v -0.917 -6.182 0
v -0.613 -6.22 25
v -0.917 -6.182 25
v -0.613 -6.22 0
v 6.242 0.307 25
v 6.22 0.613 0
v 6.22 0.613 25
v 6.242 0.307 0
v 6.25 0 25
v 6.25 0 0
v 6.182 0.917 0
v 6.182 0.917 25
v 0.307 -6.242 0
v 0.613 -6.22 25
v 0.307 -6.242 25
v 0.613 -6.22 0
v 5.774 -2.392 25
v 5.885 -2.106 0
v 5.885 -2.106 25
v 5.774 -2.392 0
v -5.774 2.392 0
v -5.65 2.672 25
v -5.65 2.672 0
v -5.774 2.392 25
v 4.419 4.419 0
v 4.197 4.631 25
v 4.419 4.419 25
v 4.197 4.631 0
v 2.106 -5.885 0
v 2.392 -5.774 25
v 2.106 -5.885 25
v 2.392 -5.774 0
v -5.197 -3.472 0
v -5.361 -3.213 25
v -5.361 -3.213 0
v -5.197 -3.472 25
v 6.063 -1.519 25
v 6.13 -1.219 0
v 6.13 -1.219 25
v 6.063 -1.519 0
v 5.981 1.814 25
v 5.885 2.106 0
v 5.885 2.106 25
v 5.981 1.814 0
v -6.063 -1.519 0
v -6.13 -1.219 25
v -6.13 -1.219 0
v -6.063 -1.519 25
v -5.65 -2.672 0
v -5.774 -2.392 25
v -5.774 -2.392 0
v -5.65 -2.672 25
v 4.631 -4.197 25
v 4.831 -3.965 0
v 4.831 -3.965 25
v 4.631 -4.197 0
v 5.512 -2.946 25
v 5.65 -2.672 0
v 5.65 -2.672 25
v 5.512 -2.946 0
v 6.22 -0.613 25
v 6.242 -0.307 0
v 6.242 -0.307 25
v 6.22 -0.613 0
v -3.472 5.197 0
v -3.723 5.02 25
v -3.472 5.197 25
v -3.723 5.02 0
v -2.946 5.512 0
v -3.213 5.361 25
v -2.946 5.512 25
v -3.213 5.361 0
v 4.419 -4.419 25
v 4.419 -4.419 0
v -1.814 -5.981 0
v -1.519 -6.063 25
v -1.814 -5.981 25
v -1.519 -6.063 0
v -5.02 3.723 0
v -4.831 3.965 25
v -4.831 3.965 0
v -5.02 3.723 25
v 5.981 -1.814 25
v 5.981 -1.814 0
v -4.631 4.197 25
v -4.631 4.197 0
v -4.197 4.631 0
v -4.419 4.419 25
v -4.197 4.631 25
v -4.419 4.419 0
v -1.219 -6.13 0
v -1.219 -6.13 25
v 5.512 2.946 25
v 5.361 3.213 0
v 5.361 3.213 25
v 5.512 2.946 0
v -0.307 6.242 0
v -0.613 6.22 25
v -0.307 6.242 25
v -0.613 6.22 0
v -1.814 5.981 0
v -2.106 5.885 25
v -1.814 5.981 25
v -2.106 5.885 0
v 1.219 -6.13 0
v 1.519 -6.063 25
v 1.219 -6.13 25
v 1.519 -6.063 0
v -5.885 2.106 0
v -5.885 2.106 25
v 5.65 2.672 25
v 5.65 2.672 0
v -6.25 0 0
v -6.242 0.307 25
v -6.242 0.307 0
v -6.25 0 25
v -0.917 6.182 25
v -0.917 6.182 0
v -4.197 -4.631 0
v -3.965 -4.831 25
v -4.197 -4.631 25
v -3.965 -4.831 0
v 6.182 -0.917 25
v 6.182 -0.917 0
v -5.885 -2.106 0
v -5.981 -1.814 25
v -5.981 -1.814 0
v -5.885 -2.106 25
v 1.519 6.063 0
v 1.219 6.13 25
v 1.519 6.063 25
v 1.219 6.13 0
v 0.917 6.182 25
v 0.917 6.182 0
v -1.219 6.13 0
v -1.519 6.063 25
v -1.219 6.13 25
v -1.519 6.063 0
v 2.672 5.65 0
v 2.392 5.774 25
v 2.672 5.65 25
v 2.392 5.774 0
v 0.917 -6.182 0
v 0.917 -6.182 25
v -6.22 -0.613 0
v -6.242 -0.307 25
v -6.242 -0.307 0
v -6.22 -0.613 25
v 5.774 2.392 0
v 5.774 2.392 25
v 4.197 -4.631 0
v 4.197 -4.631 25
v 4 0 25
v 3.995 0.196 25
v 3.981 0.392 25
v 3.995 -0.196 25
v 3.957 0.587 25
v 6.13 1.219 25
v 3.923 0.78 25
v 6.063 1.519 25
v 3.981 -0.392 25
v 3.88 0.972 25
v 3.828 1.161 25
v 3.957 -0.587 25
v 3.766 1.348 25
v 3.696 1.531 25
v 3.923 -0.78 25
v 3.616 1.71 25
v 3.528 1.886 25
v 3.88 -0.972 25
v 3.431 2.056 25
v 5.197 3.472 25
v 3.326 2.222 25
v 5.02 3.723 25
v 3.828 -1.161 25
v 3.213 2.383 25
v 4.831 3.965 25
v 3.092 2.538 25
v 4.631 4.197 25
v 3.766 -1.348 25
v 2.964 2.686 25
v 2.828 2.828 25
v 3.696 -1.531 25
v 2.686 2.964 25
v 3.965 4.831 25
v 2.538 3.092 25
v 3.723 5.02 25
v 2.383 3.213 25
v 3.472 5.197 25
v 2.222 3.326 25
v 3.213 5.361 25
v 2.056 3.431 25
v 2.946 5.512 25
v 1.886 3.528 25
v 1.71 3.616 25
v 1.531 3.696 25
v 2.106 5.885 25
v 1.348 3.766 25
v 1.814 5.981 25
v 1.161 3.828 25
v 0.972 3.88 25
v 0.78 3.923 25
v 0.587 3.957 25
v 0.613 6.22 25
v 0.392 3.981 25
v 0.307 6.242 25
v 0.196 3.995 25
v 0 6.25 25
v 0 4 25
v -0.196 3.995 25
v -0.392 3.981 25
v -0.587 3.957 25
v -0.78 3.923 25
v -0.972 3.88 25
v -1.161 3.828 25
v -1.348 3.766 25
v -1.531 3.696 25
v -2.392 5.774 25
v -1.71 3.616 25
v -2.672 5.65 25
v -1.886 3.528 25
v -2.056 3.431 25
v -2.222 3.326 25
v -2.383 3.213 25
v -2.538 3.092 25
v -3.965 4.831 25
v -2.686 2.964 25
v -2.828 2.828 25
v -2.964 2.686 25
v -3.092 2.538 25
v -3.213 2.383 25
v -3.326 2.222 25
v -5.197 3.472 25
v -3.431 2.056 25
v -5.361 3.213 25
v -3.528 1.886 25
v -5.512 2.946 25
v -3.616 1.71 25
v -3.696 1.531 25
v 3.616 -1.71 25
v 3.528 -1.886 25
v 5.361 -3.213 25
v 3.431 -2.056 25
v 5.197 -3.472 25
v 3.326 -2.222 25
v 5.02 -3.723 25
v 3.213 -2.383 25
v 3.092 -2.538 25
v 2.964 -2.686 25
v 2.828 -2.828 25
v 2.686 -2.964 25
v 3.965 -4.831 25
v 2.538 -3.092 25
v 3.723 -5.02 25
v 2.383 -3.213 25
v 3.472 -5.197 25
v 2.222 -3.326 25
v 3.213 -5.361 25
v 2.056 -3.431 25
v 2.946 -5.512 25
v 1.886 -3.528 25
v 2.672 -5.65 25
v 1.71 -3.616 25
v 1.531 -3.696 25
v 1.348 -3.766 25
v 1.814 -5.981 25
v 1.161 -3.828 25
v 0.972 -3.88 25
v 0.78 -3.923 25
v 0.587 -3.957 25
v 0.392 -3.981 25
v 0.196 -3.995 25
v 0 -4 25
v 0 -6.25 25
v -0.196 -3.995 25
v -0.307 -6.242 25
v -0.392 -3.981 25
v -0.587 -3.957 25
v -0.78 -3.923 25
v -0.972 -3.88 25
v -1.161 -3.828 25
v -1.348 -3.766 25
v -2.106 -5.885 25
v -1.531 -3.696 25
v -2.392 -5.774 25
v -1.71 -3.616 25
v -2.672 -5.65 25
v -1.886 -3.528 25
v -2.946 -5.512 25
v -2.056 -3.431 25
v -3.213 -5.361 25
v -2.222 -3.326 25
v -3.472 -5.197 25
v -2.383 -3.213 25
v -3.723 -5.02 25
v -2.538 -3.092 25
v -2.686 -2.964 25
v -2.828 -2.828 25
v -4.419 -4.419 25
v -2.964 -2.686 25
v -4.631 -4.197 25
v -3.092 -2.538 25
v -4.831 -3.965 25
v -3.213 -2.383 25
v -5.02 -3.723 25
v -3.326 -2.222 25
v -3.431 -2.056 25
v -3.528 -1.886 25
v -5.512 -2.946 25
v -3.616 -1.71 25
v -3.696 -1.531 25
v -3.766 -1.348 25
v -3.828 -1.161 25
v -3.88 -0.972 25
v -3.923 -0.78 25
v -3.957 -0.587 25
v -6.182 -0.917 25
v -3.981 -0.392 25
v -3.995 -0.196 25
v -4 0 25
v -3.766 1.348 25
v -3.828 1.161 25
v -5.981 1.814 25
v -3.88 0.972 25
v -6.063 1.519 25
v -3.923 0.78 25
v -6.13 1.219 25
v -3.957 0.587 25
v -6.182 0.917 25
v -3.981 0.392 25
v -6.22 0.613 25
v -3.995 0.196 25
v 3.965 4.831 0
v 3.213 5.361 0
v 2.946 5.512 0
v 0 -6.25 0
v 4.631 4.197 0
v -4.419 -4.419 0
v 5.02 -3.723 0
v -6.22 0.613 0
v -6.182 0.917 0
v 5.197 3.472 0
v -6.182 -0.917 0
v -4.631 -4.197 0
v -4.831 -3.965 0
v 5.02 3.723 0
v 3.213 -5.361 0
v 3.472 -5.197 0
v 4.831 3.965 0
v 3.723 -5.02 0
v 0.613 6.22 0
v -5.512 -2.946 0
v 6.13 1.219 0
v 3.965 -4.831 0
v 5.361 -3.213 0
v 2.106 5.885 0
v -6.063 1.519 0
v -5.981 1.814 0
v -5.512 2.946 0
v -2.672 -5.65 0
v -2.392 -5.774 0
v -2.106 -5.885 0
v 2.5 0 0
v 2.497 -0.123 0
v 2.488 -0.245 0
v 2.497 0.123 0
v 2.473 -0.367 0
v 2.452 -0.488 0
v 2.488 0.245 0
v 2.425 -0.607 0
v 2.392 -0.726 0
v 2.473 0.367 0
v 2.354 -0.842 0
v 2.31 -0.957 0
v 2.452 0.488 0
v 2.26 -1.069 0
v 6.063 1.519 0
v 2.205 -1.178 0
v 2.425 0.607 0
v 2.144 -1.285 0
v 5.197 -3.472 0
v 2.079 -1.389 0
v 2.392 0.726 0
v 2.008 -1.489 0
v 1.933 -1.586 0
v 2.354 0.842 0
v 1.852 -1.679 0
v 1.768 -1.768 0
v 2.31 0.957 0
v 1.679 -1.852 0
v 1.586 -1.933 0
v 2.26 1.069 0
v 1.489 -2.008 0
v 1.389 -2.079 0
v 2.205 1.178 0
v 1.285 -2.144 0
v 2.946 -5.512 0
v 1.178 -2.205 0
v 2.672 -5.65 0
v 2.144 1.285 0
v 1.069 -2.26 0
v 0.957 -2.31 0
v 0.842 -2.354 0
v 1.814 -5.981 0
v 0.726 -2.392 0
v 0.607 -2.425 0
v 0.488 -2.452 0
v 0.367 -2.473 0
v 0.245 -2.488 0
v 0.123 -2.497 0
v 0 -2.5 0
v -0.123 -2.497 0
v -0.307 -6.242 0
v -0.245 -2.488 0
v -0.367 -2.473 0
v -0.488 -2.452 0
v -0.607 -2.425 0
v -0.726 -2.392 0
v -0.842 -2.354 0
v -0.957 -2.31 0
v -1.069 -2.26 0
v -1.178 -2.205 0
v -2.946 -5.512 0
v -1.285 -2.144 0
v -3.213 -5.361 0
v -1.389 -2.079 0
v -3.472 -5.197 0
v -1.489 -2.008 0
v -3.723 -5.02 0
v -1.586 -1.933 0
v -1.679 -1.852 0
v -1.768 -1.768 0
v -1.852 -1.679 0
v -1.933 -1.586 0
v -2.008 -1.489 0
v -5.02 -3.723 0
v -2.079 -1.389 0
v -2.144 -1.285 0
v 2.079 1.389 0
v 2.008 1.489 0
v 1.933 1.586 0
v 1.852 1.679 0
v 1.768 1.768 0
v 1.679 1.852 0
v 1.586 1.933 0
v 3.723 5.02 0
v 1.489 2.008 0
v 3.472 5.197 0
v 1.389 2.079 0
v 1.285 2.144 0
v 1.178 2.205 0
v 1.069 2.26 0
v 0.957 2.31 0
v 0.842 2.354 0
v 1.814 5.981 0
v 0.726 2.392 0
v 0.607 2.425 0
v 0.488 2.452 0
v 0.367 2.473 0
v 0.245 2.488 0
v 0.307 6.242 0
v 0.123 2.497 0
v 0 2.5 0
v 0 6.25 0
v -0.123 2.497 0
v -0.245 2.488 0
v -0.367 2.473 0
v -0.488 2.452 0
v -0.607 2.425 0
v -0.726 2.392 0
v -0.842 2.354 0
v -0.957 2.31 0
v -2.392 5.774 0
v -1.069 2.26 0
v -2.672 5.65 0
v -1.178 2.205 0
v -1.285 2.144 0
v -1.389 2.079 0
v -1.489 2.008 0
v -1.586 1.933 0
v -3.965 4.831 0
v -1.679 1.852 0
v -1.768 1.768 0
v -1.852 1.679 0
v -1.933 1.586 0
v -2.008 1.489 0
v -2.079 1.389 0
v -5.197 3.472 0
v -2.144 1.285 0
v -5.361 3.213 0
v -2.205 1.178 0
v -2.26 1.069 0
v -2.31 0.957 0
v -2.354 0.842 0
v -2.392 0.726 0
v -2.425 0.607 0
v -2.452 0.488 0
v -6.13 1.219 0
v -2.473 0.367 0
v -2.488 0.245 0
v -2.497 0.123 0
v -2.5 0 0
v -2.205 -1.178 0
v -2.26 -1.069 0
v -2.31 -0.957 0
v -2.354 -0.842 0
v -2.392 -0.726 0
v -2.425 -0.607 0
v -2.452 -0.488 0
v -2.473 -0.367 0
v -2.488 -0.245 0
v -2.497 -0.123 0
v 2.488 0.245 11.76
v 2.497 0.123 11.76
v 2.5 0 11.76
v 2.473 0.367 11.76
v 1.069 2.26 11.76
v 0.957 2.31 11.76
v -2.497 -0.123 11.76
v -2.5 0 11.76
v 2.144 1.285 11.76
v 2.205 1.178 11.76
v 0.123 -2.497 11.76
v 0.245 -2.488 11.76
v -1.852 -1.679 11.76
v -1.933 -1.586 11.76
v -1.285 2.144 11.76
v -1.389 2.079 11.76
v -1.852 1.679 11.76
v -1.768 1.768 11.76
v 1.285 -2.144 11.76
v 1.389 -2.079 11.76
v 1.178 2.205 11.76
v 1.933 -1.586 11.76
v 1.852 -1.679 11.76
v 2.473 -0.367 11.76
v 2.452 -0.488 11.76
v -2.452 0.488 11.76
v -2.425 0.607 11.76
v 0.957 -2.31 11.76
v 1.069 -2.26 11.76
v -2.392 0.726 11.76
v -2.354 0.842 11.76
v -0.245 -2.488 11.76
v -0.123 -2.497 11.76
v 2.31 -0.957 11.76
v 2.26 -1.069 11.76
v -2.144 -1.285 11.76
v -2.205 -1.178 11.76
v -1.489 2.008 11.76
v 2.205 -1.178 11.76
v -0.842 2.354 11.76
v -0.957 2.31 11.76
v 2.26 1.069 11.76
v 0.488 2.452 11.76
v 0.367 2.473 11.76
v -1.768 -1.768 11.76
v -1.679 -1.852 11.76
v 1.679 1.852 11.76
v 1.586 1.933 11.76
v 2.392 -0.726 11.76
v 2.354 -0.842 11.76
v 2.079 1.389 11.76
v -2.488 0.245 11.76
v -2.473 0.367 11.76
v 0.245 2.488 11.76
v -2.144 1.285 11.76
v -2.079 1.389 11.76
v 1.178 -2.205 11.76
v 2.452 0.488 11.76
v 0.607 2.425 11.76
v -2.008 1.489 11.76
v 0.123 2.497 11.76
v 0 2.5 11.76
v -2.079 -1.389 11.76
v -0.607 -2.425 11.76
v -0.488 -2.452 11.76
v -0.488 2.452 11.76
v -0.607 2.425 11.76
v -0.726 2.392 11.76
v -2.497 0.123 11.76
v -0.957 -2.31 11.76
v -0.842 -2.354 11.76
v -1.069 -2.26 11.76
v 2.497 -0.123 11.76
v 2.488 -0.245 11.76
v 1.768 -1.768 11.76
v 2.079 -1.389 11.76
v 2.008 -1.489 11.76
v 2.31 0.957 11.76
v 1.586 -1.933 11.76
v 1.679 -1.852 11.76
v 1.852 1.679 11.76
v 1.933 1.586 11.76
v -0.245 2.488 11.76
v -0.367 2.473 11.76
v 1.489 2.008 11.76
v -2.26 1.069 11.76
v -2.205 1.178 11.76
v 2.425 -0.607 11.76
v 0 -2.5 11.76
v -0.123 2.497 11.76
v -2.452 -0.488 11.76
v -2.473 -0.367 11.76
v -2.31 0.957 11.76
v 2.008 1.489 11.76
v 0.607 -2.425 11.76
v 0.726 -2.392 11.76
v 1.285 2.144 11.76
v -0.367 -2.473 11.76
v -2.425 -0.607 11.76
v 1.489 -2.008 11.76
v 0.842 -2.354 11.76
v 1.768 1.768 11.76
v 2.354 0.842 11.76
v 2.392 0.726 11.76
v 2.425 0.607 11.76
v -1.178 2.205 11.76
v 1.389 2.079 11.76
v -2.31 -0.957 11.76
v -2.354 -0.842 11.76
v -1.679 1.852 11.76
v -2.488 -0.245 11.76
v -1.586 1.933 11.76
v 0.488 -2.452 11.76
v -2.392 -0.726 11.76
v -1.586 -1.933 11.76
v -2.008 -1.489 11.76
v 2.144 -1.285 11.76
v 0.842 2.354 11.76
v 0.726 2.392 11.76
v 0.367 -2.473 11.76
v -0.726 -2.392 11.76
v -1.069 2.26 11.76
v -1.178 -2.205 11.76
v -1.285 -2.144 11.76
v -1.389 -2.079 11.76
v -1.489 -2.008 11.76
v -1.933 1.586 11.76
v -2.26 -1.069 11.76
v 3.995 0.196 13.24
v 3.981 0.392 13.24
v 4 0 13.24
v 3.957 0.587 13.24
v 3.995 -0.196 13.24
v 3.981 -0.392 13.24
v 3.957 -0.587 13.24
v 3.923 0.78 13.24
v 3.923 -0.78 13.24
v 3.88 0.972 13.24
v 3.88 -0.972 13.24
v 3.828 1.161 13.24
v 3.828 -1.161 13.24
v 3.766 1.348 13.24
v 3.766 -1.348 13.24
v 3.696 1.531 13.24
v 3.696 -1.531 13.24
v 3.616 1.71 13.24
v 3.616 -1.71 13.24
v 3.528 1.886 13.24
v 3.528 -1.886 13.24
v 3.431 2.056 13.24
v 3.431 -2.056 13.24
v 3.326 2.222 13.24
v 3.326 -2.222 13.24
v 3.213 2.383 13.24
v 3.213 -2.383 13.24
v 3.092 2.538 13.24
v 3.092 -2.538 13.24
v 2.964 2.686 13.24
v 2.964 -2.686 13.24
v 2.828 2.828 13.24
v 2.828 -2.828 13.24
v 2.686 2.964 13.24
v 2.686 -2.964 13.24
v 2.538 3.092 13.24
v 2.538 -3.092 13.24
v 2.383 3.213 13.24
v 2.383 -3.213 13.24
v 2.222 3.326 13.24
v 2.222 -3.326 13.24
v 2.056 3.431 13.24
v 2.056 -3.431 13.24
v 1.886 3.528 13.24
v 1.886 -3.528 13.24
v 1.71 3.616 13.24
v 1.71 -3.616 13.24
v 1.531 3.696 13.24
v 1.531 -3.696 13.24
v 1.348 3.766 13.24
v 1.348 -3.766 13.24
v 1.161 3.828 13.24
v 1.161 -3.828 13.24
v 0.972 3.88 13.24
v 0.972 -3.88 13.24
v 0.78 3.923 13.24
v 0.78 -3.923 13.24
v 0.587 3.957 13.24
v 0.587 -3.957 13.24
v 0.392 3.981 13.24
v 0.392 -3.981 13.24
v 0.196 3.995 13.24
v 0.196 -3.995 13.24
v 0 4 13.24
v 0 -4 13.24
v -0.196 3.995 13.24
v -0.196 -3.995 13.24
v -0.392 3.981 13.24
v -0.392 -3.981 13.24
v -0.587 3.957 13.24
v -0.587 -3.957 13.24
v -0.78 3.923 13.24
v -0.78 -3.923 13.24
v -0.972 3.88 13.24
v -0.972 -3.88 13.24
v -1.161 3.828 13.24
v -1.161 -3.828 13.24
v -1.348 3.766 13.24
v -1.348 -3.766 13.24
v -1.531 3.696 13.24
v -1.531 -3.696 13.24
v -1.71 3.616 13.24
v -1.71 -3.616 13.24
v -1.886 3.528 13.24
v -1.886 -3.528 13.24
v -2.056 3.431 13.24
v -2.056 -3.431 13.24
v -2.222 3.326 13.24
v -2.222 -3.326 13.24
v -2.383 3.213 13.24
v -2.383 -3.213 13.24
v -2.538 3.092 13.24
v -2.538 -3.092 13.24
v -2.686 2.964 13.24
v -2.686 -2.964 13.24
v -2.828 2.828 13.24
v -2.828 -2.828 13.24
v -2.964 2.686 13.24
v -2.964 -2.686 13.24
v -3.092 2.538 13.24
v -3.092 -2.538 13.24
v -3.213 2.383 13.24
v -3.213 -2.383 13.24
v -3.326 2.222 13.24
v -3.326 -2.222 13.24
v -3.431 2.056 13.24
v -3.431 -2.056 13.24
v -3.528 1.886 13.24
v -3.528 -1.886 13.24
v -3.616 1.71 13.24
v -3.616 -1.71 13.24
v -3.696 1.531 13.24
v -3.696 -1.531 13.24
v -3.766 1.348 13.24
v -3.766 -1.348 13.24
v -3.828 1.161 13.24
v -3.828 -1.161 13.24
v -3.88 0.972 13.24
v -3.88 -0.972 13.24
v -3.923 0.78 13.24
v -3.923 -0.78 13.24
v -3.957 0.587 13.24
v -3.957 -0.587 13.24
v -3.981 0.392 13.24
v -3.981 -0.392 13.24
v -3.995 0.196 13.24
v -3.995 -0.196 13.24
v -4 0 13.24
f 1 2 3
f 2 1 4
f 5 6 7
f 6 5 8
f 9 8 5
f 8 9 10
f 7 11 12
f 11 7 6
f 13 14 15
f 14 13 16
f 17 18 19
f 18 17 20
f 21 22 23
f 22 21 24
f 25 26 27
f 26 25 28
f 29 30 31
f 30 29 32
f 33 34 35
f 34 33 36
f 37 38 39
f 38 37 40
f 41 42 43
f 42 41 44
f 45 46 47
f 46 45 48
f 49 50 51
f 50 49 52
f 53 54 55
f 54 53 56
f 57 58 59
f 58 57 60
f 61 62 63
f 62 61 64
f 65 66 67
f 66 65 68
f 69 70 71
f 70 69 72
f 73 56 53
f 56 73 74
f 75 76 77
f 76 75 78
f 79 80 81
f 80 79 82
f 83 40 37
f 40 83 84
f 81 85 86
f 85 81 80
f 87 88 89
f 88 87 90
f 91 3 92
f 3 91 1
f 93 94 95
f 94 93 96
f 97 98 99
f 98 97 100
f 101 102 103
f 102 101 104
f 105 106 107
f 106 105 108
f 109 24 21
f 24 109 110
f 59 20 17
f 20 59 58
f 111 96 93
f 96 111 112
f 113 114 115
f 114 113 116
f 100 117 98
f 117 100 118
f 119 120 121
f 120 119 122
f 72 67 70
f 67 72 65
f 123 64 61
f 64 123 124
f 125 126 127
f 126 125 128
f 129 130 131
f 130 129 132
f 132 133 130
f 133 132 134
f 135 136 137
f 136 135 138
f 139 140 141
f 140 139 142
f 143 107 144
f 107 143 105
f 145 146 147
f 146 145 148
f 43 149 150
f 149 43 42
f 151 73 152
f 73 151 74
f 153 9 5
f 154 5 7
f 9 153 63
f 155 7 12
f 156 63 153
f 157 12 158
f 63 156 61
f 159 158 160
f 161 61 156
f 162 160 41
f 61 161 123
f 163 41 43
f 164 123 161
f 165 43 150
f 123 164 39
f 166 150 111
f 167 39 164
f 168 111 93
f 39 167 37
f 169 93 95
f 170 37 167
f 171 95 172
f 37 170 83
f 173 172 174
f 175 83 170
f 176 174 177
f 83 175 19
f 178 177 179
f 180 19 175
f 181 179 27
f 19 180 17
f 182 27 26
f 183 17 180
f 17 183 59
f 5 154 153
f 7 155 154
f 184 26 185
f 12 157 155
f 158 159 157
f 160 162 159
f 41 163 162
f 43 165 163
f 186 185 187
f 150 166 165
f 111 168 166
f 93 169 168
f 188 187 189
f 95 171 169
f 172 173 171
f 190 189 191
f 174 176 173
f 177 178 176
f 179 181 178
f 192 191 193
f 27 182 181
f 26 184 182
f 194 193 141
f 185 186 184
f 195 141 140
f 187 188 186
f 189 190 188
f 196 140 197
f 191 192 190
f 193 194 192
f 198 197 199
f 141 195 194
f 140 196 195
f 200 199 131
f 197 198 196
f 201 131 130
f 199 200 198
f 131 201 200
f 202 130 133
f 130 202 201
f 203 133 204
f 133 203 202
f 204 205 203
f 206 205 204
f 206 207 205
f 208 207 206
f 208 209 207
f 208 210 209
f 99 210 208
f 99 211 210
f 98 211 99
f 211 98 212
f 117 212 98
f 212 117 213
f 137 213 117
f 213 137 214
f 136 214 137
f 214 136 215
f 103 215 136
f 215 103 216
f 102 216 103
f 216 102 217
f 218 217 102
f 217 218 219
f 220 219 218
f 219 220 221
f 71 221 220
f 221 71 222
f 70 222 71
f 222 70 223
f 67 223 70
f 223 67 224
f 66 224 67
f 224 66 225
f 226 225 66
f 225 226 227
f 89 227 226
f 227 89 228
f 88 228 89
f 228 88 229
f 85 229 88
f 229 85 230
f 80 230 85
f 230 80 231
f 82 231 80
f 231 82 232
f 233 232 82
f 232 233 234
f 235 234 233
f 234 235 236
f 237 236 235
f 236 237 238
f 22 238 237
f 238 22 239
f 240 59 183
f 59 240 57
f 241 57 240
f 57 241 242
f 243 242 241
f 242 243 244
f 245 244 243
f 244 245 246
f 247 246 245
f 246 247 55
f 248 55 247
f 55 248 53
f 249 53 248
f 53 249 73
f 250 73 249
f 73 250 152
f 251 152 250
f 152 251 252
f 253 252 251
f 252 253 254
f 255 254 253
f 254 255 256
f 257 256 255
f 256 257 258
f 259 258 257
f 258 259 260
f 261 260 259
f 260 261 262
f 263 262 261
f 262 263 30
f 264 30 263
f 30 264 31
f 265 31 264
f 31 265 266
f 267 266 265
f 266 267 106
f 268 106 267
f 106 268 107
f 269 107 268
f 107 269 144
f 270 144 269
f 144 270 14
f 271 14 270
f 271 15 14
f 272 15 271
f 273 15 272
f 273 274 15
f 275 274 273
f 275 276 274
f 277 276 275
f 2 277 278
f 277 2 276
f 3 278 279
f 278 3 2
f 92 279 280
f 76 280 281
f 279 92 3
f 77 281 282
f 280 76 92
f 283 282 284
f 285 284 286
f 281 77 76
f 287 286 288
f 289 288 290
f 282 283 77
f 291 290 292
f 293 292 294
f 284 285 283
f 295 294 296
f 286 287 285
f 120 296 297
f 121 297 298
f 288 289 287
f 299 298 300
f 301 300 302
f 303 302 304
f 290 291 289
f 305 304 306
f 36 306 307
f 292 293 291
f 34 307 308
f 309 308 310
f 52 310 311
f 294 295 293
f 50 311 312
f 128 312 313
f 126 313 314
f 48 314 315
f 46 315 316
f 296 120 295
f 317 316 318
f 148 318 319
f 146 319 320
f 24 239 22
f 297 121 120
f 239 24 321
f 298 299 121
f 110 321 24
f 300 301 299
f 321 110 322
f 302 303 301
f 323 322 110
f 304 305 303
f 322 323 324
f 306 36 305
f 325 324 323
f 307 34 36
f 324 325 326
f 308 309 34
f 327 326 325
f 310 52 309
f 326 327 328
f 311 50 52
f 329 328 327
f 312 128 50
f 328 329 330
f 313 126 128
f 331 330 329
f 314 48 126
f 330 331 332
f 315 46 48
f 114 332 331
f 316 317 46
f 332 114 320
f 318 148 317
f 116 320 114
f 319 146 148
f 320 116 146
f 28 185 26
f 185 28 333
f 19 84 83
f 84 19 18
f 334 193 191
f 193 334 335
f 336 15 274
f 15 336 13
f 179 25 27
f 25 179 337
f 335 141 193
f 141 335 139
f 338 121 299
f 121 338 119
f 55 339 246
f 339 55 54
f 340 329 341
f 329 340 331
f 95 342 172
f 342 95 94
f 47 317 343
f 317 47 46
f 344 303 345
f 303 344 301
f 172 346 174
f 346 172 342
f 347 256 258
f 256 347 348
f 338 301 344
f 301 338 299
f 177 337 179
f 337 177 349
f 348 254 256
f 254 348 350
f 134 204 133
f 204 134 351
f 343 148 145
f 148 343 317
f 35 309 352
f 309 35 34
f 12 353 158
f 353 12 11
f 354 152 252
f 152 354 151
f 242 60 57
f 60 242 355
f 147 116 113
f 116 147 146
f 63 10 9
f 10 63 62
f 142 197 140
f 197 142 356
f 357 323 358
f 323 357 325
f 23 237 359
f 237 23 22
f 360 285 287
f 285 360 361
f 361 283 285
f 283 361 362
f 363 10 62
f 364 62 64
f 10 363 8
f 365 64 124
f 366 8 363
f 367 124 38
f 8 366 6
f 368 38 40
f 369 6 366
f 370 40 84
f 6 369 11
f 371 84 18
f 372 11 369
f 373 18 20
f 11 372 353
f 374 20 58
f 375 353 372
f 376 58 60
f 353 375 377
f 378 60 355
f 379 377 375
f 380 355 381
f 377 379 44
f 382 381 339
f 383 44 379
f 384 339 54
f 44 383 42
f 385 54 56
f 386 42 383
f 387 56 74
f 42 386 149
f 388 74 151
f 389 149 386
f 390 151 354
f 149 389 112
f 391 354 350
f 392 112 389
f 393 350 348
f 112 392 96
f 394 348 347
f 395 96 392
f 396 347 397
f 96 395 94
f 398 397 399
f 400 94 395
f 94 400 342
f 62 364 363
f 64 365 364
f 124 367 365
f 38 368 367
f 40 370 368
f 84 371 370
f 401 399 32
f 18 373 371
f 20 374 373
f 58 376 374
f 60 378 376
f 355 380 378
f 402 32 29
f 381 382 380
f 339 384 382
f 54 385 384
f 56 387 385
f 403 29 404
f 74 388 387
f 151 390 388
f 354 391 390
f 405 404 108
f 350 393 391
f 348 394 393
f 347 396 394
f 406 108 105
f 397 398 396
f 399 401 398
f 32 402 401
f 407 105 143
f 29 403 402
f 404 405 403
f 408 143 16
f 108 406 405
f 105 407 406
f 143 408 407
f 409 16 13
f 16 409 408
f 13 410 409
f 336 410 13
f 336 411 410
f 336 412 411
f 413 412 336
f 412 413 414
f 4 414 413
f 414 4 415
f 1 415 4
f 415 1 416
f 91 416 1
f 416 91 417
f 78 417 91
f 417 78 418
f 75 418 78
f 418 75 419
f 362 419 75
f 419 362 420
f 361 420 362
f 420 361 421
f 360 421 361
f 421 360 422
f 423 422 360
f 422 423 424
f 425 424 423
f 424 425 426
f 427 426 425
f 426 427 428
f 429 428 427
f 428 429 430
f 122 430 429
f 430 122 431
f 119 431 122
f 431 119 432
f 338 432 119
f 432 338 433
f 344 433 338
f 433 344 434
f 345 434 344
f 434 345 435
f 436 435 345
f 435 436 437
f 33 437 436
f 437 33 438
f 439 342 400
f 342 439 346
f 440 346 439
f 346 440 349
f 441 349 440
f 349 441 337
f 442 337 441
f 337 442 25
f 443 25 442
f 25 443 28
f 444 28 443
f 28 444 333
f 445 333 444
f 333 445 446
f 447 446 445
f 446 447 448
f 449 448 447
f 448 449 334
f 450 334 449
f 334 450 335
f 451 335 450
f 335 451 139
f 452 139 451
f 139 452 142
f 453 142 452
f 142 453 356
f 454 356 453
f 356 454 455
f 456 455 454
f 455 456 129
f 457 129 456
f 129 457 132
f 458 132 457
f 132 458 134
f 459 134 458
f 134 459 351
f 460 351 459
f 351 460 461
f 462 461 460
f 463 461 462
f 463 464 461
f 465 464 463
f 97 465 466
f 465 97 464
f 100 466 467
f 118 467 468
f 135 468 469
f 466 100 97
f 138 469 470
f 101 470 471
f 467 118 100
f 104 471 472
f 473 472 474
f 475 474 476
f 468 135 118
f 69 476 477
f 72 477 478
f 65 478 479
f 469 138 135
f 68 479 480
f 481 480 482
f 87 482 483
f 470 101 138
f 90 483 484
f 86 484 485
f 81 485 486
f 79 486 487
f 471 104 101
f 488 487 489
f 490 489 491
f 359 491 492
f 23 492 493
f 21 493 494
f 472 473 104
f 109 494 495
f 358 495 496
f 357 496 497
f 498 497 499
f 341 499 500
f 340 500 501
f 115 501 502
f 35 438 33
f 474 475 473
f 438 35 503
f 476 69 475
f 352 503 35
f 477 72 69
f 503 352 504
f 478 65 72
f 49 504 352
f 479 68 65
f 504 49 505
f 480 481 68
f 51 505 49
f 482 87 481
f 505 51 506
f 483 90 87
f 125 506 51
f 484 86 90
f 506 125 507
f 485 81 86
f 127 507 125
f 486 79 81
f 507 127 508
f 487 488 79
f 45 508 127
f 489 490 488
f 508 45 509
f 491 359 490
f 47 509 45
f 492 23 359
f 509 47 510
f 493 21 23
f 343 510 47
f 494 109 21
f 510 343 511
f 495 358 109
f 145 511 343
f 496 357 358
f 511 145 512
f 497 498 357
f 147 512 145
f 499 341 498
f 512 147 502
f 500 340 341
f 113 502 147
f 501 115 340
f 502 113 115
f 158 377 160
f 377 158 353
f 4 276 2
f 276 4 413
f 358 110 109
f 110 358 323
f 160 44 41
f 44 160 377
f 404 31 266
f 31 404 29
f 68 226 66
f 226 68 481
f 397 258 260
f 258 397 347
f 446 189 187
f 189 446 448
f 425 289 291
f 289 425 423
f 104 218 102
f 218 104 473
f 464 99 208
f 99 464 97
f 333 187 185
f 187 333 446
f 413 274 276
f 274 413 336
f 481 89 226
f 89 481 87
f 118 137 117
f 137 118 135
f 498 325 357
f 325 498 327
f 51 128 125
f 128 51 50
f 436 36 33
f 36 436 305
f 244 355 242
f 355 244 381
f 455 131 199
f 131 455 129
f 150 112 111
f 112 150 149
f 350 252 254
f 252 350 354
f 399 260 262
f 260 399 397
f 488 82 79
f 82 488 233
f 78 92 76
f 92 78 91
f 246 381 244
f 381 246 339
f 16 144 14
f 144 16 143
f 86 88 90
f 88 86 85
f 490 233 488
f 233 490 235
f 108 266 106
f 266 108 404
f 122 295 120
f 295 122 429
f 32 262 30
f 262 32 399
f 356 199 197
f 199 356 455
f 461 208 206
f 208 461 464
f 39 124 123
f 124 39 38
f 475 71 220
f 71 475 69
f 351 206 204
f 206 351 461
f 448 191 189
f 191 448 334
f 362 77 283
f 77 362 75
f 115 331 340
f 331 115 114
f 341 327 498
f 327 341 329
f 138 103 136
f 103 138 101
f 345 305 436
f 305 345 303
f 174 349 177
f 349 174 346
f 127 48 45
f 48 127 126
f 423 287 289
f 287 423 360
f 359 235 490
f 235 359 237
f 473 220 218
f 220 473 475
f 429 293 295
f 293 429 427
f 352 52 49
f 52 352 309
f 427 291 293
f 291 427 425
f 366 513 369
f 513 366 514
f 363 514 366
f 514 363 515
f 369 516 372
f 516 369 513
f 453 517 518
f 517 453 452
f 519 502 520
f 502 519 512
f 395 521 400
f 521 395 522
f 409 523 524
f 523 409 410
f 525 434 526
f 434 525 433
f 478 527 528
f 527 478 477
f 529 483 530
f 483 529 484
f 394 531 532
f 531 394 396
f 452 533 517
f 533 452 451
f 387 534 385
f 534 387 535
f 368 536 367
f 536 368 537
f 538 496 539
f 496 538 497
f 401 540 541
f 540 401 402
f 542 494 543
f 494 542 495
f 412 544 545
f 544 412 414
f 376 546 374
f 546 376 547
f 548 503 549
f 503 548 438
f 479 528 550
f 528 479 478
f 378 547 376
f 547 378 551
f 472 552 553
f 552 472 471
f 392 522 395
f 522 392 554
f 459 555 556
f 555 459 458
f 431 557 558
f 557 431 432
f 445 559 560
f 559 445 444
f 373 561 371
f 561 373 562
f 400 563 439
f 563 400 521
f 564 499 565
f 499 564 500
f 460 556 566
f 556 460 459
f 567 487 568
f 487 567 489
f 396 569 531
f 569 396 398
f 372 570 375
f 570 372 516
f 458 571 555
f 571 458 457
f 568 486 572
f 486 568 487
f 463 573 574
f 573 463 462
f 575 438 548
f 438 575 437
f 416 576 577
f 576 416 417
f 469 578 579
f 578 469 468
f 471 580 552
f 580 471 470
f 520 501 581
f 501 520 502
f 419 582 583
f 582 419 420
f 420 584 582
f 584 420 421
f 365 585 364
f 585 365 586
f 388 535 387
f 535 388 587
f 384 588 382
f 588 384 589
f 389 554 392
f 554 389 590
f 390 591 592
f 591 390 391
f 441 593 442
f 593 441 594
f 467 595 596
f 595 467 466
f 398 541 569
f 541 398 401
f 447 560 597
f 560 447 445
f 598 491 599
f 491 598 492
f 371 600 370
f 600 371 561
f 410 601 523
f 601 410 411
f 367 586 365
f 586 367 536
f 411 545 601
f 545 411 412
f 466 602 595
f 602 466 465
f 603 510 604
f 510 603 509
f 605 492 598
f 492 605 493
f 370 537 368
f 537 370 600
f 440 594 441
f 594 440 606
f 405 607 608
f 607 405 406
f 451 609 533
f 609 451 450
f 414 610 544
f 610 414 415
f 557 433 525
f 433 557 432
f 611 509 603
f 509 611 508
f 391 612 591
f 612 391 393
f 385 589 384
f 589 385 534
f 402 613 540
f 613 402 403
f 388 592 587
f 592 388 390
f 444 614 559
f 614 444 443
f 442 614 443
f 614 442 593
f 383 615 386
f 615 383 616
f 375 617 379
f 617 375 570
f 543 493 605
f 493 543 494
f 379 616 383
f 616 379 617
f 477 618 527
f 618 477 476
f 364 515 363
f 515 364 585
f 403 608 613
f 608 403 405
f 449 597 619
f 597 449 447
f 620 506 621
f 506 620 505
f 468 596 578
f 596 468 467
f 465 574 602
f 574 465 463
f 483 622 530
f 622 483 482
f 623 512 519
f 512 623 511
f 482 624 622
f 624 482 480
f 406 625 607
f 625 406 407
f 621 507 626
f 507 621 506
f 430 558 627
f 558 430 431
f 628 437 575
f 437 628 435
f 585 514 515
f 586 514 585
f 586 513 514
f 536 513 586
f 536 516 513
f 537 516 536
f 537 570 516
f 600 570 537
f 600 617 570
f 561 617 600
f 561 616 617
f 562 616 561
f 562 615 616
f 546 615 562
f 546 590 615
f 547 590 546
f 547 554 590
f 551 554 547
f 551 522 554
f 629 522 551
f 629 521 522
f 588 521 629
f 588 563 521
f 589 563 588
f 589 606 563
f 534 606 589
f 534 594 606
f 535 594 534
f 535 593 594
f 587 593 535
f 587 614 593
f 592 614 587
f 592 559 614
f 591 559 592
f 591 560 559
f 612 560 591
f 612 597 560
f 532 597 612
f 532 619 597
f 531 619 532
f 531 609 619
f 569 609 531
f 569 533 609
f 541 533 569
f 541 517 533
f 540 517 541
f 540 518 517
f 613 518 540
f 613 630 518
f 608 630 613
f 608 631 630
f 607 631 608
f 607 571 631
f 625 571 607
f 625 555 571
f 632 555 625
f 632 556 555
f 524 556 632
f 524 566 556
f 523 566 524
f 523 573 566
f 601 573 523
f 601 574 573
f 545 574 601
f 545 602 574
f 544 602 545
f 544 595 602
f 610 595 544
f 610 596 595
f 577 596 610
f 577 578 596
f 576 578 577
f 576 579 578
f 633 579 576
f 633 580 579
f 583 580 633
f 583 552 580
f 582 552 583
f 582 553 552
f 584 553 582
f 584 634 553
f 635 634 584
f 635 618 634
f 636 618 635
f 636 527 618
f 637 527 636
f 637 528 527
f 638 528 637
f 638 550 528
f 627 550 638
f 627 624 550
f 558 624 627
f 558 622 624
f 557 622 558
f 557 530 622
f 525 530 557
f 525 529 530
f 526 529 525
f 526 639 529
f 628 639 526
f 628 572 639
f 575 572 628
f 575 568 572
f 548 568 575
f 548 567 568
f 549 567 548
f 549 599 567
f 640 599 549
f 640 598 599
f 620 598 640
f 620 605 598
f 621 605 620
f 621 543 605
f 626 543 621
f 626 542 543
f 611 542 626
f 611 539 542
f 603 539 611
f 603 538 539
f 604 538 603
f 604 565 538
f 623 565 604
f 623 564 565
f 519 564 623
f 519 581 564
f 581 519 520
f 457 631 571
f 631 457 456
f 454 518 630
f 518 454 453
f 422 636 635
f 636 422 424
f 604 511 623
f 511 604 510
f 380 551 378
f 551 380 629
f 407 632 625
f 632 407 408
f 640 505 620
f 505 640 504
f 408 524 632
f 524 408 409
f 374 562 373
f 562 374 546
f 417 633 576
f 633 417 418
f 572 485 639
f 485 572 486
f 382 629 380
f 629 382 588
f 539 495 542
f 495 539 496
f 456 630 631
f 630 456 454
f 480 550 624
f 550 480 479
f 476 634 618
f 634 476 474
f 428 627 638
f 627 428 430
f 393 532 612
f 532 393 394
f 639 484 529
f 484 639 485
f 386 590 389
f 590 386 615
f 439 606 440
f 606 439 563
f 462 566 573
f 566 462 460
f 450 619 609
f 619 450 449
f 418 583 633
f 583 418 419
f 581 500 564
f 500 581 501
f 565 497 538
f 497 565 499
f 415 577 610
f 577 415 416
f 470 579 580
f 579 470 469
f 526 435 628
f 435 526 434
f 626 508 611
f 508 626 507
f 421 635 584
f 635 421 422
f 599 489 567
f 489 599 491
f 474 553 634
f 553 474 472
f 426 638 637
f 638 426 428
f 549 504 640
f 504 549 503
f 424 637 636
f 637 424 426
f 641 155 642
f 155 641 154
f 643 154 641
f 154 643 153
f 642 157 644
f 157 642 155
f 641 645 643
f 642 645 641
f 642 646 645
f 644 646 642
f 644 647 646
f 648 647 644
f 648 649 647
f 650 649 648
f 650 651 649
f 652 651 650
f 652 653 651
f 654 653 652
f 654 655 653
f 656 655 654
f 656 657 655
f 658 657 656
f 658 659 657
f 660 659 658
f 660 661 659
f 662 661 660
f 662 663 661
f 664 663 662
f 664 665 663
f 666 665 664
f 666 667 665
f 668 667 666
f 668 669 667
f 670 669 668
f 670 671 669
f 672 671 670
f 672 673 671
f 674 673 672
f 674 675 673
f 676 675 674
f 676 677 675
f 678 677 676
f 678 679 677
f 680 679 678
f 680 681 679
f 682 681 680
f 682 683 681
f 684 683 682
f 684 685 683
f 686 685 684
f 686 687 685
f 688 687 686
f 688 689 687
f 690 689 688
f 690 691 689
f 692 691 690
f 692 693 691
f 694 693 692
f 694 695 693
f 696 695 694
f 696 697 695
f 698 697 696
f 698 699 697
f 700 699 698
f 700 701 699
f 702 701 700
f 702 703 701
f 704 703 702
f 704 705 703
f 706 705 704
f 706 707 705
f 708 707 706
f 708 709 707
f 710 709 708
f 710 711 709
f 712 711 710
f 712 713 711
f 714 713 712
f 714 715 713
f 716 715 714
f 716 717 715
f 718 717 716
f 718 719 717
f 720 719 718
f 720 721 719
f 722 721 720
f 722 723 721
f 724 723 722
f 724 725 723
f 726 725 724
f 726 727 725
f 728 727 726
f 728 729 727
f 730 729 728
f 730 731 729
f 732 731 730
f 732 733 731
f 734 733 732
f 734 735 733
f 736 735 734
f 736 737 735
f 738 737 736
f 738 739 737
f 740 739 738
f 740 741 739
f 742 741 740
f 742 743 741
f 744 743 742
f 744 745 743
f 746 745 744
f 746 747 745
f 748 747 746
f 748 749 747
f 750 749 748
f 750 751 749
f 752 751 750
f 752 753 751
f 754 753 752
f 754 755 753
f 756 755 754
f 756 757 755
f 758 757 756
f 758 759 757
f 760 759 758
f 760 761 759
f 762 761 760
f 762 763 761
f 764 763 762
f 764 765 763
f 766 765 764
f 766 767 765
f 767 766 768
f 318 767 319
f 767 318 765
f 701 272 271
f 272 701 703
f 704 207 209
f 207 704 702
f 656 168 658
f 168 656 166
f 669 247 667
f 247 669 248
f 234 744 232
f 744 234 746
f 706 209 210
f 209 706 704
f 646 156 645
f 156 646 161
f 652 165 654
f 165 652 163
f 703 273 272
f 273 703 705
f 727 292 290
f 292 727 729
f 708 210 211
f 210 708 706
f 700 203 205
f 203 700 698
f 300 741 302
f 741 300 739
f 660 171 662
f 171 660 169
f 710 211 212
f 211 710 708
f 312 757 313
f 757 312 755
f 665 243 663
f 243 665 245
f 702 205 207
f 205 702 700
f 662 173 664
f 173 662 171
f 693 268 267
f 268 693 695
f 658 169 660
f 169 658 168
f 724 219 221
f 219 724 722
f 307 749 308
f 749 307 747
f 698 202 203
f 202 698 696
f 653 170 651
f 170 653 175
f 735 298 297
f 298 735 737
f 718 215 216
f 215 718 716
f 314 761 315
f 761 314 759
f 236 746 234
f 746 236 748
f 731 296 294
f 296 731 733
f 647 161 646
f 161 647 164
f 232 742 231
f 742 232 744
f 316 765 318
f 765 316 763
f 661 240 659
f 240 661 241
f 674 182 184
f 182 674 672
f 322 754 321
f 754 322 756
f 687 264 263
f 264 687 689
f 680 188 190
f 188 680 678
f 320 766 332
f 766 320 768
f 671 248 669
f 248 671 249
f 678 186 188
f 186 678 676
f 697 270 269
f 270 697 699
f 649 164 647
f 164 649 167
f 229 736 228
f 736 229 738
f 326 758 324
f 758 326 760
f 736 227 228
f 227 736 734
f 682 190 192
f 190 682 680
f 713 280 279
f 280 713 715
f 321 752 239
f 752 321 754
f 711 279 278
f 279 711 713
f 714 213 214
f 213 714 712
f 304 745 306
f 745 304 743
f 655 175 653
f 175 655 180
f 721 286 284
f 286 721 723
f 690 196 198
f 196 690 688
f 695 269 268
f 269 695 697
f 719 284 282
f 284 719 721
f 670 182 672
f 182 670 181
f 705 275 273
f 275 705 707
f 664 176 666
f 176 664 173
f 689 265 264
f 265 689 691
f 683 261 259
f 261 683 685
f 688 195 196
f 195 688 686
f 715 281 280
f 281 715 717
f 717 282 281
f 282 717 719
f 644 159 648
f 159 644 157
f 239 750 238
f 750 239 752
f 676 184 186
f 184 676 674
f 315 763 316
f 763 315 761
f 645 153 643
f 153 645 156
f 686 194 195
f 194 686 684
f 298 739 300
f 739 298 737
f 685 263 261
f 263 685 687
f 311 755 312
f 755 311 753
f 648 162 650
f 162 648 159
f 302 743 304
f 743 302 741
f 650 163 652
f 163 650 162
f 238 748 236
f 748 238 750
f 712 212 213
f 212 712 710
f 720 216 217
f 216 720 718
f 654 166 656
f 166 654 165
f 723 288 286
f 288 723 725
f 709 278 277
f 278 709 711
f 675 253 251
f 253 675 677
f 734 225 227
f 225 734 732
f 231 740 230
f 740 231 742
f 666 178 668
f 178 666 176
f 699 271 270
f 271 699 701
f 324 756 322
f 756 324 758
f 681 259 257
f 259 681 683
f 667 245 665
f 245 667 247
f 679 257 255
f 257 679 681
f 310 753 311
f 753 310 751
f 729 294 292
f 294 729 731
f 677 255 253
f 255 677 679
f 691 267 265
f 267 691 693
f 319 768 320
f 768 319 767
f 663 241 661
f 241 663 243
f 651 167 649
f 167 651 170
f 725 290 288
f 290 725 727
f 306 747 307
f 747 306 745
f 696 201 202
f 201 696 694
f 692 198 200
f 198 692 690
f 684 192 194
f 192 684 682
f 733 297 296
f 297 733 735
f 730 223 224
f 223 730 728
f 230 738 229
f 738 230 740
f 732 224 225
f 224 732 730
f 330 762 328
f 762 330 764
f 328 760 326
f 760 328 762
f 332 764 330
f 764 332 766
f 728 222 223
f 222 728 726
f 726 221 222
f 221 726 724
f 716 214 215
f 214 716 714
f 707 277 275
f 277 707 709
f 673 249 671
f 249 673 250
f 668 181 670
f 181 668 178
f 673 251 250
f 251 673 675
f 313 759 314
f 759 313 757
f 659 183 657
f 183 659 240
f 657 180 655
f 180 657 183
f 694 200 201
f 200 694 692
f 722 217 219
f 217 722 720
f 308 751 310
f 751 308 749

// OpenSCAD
$fn = 128;

// Rigid shaft coupling: 5mm to 8mm bore, 12.5mm OD, 25mm long
// Simple stepped-bore sleeve with a central divider.

od = 12.5;
len = 25.0;

bore1_d = 5.0;   // one side
bore2_d = 8.0;   // other side

divider_th = 1.5; // solid web between bores

module coupling() {
  difference() {
    cylinder(d=od, h=len);

    // Bore for 5mm shaft (from one end to divider)
    translate([0,0,-0.01])
      cylinder(d=bore1_d, h=(len - divider_th)/2 + 0.02);

    // Bore for 8mm shaft (from other end to divider)
    translate([0,0,len - (len - divider_th)/2 - 0.01])
      cylinder(d=bore2_d, h=(len - divider_th)/2 + 0.02);
  }
}

coupling();
